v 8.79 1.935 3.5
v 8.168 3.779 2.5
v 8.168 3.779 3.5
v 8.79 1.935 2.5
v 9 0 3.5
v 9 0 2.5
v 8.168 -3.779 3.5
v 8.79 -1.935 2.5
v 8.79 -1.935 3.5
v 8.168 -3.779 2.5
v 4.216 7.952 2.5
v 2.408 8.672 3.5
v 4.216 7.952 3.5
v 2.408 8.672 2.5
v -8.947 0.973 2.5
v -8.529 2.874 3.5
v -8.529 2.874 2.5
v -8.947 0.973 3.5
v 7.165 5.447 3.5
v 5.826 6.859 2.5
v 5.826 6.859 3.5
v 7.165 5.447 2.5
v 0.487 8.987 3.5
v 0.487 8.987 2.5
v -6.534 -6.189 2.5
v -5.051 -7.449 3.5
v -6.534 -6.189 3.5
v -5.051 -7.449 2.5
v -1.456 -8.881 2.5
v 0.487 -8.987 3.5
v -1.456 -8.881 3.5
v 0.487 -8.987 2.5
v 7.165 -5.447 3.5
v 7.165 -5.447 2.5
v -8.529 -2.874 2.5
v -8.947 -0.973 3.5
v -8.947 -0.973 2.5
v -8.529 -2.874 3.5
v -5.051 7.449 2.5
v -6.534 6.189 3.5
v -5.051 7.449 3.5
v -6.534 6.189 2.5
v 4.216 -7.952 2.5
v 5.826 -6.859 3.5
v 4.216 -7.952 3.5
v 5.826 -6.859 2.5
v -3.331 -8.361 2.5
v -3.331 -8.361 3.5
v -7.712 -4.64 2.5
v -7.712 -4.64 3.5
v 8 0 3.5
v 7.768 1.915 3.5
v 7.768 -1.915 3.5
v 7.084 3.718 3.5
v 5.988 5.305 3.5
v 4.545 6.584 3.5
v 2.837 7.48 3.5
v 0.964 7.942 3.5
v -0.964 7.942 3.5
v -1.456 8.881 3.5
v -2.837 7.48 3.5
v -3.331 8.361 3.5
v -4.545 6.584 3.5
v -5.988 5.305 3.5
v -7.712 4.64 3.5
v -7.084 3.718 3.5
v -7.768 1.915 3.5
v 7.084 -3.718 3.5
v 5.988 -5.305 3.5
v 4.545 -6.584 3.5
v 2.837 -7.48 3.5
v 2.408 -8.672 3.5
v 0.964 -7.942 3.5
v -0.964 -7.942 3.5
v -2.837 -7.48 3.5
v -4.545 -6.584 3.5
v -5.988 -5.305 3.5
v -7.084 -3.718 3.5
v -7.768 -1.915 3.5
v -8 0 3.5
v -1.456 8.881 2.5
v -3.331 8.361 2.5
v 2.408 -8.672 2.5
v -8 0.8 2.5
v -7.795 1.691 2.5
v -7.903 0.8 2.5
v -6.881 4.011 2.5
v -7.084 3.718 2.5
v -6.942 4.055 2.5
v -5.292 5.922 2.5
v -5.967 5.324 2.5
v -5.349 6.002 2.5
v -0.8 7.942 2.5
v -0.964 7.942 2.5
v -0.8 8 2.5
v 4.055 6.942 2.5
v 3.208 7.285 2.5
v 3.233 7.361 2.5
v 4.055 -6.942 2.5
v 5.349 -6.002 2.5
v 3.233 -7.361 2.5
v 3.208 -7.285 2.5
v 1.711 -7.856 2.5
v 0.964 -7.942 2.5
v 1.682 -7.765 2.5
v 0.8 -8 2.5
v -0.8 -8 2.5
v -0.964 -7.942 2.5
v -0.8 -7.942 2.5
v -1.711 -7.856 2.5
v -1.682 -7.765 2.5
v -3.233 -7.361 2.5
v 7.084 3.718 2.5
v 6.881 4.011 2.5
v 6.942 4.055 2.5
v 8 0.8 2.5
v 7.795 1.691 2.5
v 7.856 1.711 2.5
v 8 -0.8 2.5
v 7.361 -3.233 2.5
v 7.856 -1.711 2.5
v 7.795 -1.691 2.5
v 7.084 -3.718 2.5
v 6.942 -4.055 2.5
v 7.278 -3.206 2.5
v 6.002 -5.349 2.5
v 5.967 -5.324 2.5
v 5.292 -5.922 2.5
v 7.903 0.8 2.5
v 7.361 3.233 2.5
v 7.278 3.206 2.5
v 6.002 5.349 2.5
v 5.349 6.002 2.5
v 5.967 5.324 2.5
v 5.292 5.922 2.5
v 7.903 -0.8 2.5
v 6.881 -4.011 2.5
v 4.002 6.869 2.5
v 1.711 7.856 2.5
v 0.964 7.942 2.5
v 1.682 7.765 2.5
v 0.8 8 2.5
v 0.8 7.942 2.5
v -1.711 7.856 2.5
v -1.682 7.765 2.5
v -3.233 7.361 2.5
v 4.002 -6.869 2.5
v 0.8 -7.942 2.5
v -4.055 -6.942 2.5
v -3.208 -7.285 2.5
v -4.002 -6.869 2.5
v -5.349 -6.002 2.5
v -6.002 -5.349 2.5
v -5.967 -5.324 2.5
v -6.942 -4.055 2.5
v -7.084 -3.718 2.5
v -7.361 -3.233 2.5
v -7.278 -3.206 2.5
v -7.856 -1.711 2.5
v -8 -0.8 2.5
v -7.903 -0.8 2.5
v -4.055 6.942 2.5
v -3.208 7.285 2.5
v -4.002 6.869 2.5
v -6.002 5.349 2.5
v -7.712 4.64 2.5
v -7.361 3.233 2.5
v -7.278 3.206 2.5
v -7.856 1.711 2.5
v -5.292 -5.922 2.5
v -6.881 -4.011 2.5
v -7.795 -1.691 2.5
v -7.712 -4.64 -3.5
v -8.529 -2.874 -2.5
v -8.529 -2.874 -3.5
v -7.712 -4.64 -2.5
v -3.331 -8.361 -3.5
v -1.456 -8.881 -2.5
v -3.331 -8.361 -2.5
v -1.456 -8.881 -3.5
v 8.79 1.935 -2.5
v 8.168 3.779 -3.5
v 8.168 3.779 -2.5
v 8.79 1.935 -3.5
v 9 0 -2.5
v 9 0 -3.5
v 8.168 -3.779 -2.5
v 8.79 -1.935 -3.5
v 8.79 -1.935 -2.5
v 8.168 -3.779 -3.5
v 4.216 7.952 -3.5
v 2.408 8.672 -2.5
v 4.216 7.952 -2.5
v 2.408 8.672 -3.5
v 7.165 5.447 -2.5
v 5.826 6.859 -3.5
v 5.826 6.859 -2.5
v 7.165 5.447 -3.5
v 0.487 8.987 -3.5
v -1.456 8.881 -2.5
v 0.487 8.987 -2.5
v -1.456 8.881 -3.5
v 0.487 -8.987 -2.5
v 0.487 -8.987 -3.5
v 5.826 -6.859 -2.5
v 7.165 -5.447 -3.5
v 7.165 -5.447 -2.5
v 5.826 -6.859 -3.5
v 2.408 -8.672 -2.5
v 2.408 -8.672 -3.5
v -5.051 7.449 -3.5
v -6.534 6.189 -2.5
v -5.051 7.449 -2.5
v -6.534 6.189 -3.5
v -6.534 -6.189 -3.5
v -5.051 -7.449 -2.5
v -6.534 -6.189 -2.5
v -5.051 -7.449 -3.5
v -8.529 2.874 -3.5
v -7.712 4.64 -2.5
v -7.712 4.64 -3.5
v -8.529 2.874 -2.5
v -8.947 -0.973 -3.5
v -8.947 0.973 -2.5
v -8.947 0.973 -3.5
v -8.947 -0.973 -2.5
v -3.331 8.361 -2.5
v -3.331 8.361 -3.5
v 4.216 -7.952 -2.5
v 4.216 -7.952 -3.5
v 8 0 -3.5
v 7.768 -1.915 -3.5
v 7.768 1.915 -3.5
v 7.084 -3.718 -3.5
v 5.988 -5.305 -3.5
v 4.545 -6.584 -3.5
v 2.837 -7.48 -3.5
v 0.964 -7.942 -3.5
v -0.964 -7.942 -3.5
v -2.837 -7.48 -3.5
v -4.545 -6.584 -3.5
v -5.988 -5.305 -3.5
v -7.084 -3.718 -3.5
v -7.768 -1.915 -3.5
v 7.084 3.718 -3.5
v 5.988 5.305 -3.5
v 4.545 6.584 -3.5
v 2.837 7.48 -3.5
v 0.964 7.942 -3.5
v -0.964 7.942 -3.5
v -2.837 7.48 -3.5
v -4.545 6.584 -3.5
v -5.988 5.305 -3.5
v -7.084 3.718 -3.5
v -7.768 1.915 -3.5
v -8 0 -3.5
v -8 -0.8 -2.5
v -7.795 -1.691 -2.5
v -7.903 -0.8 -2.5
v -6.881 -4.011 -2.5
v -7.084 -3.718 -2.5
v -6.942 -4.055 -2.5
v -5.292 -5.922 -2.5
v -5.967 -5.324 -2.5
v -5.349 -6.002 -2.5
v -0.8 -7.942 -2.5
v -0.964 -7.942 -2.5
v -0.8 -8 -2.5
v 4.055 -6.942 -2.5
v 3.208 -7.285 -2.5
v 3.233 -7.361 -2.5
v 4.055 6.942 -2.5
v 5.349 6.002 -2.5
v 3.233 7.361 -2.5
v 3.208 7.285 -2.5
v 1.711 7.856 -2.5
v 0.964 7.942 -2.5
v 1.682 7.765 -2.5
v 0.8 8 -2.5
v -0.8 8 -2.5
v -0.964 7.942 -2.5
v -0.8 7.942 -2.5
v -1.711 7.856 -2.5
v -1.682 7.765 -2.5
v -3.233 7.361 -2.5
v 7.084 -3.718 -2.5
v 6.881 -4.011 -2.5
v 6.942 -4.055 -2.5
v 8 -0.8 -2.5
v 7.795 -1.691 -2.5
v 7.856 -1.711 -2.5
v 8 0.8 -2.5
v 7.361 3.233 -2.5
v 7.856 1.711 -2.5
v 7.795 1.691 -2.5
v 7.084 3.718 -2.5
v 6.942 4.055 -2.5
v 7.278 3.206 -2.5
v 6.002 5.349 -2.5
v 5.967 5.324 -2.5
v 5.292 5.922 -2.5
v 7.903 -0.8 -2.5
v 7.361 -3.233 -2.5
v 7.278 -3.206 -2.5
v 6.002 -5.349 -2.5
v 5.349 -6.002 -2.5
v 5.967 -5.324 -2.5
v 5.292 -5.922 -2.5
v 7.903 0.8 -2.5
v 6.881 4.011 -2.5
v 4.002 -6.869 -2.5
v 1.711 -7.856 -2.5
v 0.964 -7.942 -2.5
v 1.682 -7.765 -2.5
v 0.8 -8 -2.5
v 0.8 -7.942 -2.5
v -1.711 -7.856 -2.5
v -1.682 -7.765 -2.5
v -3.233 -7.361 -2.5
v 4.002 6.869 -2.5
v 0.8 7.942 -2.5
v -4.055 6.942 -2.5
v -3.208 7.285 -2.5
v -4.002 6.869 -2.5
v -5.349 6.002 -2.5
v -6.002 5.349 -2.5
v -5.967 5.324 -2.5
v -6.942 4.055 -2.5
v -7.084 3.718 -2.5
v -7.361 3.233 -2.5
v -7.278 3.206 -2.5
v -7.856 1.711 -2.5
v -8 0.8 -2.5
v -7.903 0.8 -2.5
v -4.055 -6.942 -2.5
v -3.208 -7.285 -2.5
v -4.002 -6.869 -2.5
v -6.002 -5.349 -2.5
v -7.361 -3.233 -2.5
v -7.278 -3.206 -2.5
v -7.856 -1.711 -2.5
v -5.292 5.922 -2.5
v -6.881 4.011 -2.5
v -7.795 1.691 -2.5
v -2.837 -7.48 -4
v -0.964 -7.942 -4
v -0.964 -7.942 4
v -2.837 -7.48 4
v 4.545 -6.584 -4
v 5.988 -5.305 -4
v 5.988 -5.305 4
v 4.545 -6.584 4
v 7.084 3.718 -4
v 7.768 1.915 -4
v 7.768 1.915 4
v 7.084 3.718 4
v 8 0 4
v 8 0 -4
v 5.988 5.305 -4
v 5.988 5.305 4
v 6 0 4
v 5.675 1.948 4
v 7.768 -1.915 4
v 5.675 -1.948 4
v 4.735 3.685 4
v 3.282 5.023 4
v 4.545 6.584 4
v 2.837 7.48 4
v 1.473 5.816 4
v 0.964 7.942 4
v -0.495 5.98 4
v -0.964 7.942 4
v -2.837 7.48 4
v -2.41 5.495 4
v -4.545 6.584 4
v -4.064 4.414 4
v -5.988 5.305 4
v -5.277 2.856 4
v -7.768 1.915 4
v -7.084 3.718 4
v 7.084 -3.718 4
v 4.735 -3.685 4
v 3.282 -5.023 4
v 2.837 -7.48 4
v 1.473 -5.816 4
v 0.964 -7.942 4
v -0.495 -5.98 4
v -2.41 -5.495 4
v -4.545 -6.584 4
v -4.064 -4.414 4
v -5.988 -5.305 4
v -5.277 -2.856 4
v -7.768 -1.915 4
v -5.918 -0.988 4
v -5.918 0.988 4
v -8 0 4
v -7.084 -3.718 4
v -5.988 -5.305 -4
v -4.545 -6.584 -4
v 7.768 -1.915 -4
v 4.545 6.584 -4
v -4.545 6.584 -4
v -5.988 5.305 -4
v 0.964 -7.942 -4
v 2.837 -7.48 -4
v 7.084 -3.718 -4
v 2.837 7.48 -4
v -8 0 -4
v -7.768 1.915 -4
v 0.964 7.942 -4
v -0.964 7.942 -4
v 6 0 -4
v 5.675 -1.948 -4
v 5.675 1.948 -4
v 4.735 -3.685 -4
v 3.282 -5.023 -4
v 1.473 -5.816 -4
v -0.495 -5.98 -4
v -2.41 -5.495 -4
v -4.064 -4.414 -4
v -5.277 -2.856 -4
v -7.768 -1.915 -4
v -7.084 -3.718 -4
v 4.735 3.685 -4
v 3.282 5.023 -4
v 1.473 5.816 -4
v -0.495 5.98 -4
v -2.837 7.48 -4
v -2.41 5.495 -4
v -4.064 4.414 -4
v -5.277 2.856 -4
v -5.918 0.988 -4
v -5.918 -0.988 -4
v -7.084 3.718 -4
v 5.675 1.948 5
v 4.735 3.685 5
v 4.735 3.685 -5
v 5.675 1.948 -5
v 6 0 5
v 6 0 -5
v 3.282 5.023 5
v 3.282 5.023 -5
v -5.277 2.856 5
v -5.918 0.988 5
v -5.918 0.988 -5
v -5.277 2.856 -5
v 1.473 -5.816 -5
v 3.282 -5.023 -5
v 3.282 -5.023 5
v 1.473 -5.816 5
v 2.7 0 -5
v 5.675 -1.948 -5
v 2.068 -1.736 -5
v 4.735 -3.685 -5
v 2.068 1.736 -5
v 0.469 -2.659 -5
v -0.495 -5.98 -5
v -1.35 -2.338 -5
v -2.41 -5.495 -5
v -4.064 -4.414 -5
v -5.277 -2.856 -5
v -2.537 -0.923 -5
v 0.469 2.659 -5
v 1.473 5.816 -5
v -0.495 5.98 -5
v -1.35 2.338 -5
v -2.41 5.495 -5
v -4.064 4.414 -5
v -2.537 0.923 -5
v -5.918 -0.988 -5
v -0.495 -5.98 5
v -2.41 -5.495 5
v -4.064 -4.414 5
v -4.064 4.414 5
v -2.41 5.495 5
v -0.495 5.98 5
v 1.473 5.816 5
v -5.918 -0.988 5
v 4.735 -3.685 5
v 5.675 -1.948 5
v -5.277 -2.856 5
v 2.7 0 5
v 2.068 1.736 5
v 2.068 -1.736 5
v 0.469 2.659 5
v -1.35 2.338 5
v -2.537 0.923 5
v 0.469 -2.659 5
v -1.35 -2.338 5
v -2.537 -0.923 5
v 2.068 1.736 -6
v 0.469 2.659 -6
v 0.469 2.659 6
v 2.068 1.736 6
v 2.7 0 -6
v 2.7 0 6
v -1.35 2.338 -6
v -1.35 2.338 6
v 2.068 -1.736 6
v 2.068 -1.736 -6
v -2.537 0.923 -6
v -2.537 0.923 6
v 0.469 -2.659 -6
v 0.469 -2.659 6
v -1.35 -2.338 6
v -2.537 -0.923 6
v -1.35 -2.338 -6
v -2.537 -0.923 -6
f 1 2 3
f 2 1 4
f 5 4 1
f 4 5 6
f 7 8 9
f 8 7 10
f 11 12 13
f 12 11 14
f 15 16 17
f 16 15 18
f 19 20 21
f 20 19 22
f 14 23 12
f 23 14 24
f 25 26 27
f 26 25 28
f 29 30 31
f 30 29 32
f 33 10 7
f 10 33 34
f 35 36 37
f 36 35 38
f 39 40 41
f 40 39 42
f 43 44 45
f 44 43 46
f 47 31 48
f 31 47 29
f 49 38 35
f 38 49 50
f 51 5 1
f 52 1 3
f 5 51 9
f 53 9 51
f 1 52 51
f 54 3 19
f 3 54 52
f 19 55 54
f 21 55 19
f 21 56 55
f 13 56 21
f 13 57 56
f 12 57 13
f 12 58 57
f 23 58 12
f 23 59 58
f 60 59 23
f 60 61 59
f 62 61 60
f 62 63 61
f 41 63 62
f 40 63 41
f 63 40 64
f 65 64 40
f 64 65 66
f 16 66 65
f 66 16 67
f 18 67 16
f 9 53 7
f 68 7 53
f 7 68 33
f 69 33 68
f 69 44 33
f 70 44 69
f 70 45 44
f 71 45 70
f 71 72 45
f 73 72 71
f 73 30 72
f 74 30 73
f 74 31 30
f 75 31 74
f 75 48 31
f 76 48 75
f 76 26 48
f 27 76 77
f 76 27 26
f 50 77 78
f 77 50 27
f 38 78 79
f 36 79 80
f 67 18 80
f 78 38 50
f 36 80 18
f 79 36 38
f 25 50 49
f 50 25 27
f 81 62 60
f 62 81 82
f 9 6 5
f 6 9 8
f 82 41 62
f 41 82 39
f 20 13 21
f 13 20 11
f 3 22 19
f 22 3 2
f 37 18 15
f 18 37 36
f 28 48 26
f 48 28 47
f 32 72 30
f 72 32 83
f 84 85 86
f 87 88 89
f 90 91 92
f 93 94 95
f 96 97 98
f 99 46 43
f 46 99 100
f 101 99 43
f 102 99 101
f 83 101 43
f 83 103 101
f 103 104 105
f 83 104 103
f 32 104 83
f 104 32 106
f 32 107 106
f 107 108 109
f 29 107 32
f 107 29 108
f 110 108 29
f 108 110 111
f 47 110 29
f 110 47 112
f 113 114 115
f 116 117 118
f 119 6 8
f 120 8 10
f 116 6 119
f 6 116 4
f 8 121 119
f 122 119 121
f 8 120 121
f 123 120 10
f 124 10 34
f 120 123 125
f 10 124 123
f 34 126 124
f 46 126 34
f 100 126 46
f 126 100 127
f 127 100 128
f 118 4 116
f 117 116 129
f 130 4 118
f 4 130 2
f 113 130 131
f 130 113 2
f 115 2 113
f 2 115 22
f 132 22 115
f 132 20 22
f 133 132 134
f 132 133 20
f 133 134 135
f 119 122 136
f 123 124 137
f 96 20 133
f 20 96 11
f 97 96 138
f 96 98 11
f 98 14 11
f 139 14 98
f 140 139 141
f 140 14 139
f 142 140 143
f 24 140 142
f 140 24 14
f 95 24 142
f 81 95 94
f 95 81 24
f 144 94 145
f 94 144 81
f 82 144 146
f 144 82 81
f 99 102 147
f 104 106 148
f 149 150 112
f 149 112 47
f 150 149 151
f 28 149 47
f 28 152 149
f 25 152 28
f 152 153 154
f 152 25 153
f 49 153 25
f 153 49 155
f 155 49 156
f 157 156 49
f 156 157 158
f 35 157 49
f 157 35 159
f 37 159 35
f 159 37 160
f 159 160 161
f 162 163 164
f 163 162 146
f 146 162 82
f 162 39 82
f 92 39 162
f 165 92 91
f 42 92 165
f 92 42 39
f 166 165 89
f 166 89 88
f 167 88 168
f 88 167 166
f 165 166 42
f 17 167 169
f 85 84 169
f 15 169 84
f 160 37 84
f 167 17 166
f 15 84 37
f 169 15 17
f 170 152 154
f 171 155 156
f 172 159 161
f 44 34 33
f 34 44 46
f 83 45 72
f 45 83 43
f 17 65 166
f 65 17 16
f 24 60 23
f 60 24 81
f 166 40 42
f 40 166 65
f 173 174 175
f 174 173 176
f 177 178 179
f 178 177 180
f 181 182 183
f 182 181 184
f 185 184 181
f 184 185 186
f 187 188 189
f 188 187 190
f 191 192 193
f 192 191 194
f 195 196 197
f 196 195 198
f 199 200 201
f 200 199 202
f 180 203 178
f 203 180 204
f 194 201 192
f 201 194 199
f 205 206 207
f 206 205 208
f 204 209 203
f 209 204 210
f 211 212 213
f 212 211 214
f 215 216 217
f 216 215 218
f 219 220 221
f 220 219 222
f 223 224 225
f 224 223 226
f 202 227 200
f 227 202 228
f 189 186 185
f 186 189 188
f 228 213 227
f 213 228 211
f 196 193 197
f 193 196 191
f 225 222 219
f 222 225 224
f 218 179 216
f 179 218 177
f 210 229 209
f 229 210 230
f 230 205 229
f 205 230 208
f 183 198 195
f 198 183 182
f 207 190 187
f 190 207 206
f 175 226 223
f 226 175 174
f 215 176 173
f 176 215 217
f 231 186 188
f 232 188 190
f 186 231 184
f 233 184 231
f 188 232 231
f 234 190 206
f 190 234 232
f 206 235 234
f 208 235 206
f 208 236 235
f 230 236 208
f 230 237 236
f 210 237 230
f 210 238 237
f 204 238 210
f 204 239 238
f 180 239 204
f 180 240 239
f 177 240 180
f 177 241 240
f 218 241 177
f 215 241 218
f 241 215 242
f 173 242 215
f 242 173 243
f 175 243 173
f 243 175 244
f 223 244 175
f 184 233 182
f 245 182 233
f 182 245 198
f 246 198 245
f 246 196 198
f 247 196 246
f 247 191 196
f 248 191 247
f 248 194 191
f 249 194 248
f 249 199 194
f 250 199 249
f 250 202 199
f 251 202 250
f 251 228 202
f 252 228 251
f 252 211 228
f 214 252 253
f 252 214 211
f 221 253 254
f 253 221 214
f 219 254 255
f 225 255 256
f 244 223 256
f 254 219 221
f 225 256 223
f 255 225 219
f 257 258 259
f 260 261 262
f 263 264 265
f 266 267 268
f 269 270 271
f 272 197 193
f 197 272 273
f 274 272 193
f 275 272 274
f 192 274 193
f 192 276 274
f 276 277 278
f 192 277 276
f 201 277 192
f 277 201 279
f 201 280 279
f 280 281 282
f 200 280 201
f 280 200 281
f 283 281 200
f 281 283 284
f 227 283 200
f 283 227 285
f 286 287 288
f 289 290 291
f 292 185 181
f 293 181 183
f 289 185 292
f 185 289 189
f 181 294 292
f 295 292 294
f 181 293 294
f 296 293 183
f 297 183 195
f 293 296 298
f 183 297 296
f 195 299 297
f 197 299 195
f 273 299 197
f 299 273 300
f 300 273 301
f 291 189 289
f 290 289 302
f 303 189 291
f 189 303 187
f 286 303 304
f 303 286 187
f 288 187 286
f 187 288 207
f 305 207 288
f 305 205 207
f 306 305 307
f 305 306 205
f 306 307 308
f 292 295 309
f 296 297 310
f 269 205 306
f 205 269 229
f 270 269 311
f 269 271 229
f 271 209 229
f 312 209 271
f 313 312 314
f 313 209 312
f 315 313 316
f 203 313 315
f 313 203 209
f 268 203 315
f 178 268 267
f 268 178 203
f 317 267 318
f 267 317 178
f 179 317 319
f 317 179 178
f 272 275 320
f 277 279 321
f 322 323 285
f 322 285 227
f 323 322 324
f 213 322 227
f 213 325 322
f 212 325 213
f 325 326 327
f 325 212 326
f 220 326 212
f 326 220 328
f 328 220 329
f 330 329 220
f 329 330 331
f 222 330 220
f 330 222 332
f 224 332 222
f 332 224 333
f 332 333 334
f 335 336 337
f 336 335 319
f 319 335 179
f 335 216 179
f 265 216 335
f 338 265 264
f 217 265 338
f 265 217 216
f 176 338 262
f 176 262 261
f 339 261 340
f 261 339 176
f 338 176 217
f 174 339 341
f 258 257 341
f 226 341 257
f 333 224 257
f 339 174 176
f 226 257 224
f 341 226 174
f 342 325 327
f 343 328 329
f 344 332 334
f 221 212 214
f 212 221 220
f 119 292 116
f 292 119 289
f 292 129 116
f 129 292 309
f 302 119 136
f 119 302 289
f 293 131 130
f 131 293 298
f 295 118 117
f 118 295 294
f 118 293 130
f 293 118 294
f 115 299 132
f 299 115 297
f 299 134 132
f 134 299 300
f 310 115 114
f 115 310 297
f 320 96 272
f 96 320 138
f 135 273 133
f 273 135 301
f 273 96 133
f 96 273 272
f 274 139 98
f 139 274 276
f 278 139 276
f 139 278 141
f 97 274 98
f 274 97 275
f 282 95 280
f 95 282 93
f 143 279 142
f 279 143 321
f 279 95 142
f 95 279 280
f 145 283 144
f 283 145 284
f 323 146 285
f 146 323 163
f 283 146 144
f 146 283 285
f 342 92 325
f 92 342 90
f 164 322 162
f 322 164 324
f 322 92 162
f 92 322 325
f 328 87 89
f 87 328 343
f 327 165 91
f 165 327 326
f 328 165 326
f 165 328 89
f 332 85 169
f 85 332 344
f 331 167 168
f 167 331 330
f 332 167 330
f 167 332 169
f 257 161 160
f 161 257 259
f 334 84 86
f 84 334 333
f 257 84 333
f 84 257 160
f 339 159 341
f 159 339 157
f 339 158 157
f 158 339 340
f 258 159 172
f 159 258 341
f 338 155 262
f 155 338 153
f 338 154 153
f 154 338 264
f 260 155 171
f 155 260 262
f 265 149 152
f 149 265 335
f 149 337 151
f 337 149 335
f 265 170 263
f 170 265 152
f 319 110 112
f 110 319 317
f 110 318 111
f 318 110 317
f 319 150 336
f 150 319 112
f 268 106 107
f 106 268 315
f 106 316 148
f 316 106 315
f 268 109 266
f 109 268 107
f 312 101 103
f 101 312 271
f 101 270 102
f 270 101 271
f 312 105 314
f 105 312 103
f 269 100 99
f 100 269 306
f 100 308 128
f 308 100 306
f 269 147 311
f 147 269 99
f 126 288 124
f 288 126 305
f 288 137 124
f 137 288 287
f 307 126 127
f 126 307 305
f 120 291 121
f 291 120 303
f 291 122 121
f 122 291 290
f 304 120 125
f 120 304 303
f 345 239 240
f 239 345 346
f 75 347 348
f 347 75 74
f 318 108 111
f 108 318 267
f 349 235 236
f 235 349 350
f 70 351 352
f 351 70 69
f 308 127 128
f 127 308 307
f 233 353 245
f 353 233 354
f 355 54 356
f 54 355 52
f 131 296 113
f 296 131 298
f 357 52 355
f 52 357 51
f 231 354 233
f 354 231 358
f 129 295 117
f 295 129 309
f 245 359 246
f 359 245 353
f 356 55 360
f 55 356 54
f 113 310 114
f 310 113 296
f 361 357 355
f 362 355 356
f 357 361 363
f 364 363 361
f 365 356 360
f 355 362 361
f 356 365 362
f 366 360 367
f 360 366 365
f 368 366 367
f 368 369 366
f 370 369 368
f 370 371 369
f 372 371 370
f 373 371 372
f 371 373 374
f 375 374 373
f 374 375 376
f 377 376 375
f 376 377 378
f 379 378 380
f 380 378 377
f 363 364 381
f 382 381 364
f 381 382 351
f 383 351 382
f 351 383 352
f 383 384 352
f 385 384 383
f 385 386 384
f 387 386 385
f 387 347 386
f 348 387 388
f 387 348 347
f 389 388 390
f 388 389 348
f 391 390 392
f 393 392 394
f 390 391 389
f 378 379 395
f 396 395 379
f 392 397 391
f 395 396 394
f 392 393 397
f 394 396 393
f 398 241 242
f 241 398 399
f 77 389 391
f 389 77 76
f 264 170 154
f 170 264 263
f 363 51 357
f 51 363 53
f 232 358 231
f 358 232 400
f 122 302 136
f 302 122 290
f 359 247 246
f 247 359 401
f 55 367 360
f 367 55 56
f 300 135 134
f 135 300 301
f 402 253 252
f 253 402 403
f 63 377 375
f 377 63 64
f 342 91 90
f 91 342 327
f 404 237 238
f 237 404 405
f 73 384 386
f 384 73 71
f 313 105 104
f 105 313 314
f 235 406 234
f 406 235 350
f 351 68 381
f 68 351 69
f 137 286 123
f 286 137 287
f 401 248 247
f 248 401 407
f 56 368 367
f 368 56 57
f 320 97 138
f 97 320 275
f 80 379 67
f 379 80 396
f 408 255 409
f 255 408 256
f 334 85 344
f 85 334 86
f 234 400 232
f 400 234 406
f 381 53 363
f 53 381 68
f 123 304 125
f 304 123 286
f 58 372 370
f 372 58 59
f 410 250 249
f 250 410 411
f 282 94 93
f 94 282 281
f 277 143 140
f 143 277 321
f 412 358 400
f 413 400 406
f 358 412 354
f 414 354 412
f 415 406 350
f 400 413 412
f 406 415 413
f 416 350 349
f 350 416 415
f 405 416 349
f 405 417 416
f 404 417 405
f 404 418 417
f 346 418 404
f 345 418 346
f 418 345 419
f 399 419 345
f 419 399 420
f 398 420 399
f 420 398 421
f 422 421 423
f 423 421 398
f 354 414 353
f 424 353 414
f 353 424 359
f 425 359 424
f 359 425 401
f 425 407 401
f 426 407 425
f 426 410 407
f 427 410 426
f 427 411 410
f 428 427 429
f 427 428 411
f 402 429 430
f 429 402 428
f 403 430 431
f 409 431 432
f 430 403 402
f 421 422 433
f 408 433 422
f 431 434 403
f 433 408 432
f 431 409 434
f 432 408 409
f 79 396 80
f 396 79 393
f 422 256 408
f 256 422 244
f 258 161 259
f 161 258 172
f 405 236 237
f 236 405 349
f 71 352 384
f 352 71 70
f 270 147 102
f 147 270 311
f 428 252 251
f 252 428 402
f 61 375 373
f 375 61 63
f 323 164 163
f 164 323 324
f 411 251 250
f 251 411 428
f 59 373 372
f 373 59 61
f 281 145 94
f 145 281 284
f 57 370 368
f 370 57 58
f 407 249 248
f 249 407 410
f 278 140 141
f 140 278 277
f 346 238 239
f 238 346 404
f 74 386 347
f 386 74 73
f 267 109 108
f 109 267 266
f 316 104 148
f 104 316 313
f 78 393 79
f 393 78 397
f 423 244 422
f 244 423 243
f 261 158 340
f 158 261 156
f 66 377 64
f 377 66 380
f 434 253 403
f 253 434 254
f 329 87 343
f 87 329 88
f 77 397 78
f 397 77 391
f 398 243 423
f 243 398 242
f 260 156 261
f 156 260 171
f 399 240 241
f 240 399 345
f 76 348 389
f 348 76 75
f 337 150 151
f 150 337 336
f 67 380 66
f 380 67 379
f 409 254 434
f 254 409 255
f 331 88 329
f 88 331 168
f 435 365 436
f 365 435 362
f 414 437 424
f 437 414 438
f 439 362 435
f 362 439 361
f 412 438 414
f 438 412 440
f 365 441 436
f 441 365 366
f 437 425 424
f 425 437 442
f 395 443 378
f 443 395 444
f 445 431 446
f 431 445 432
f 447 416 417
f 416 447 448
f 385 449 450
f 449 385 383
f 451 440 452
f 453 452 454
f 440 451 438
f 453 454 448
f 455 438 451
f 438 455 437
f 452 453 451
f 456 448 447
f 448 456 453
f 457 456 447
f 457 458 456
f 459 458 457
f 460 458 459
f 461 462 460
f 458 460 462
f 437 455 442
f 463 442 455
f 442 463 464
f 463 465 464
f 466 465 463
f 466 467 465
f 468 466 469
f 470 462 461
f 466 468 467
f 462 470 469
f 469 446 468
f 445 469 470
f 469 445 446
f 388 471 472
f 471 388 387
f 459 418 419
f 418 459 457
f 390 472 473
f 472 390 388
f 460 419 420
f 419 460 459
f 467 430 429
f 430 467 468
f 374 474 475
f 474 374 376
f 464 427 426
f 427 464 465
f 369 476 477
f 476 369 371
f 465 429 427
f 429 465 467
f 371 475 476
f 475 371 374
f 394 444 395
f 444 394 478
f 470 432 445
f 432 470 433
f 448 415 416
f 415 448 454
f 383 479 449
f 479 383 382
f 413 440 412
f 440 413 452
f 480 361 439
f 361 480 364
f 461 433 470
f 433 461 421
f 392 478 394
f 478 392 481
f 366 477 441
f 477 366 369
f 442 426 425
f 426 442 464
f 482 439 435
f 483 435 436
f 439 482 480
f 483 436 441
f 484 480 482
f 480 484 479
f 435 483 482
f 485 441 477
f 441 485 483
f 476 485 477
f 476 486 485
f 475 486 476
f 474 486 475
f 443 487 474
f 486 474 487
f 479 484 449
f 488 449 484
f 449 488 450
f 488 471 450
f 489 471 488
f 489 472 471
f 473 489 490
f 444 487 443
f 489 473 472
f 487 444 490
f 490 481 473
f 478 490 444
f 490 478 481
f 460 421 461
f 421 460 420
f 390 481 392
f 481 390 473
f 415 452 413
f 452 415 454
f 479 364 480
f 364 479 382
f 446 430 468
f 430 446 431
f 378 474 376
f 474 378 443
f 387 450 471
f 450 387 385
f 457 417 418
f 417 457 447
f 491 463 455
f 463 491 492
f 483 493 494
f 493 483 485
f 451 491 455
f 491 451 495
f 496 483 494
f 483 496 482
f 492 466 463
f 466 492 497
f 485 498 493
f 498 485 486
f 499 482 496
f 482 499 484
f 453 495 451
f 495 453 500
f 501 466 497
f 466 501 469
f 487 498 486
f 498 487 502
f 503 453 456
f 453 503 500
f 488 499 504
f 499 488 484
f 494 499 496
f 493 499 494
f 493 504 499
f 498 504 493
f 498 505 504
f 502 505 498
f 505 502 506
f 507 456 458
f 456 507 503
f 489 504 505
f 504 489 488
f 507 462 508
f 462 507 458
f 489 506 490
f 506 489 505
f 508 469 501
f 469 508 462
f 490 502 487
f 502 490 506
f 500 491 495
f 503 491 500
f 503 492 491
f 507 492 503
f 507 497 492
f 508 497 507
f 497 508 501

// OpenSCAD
// Parameters
pulley_type = 1; //[0:1:1]
tooth_profile = 0; //[0:4:1]
tooth_count = 20; //[10:60:1]
outer_diameter_mm = 16; //[8:32:0.5]
belt_width_mm = 6; //[3:20:0.5]
bore_diameter_mm = 5; //[2:12:0.1]
hub_diameter_mm = 12; //[6:24:0.5]
hub_length_mm = 10; //[5:25:0.5]
flange_diameter_mm = 18; //[10:40:0.5]
flange_thickness_mm = 1; //[0:4:0.25]
set_screw_count = 0; //[0:2:1]
set_screw_size = 3; //[2:6:1]
set_screw_z_offset_mm = 5; //[0:20:0.5]
tolerances_mm = 0.2; //[0:0.6:0.05]
overlap_mm = 1; //[0.5:2:0.1]
rim_wall_radial_mm = 2; //[1:6:0.25]
tooth_height_mm = 1.2; //[0.5:3:0.1]
tooth_width_mm = 1.6; //[0.8:4:0.1]

// Pulley - complete geometry
module pulley() {
  color("Silver") {
    // Pulley body
    union() {
      translate([0, 0, 0])
        cylinder(r=outer_diameter_mm/2, h=belt_width_mm + 2*flange_thickness_mm, center=true);
      
      // Hub
      translate([0, 0, 0])
        cylinder(r=hub_diameter_mm/2, h=hub_length_mm, center=true);
      
      // Outer rim
      translate([0, 0, 0])
        cylinder(r=outer_diameter_mm/2, h=belt_width_mm, center=true);
      
      // Flanges
      if (flange_thickness_mm > 0) {
        translate([0, 0, belt_width_mm/2 + flange_thickness_mm/2 - overlap_mm/2])
          cylinder(r=flange_diameter_mm/2, h=flange_thickness_mm, center=true);
        translate([0, 0, -(belt_width_mm/2 + flange_thickness_mm/2 - overlap_mm/2)])
          cylinder(r=flange_diameter_mm/2, h=flange_thickness_mm, center=true);
      }
      
      // Teeth or smooth crown
      if (pulley_type == 1) {
        for (i = [0:tooth_count-1]) {
          rotate([0, 0, i*360/tooth_count])
            translate([outer_diameter_mm/2 - tooth_height_mm/2, 0, 0])
              cube([tooth_height_mm, tooth_width_mm, belt_width_mm], center=true);
        }
      }
    }
    
    // Bore
    difference() {
      translate([0, 0, 0])
        cylinder(r=(bore_diameter_mm + 2*tolerances_mm)/2, h=hub_length_mm + 2*overlap_mm, center=true);
      
      // Set screw holes
      if (set_screw_count > 0) {
        for (i = [0:set_screw_count-1]) {
          rotate([0, 0, i*90])
            translate([0, 0, (-hub_length_mm/2) + set_screw_z_offset_mm])
              cylinder(r=(set_screw_size + tolerances_mm)/2, h=hub_diameter_mm + 2*overlap_mm, center=true);
        }
      }
    }
  }
}

// Assembly
module assembly() {
  pulley();
}

assembly();
